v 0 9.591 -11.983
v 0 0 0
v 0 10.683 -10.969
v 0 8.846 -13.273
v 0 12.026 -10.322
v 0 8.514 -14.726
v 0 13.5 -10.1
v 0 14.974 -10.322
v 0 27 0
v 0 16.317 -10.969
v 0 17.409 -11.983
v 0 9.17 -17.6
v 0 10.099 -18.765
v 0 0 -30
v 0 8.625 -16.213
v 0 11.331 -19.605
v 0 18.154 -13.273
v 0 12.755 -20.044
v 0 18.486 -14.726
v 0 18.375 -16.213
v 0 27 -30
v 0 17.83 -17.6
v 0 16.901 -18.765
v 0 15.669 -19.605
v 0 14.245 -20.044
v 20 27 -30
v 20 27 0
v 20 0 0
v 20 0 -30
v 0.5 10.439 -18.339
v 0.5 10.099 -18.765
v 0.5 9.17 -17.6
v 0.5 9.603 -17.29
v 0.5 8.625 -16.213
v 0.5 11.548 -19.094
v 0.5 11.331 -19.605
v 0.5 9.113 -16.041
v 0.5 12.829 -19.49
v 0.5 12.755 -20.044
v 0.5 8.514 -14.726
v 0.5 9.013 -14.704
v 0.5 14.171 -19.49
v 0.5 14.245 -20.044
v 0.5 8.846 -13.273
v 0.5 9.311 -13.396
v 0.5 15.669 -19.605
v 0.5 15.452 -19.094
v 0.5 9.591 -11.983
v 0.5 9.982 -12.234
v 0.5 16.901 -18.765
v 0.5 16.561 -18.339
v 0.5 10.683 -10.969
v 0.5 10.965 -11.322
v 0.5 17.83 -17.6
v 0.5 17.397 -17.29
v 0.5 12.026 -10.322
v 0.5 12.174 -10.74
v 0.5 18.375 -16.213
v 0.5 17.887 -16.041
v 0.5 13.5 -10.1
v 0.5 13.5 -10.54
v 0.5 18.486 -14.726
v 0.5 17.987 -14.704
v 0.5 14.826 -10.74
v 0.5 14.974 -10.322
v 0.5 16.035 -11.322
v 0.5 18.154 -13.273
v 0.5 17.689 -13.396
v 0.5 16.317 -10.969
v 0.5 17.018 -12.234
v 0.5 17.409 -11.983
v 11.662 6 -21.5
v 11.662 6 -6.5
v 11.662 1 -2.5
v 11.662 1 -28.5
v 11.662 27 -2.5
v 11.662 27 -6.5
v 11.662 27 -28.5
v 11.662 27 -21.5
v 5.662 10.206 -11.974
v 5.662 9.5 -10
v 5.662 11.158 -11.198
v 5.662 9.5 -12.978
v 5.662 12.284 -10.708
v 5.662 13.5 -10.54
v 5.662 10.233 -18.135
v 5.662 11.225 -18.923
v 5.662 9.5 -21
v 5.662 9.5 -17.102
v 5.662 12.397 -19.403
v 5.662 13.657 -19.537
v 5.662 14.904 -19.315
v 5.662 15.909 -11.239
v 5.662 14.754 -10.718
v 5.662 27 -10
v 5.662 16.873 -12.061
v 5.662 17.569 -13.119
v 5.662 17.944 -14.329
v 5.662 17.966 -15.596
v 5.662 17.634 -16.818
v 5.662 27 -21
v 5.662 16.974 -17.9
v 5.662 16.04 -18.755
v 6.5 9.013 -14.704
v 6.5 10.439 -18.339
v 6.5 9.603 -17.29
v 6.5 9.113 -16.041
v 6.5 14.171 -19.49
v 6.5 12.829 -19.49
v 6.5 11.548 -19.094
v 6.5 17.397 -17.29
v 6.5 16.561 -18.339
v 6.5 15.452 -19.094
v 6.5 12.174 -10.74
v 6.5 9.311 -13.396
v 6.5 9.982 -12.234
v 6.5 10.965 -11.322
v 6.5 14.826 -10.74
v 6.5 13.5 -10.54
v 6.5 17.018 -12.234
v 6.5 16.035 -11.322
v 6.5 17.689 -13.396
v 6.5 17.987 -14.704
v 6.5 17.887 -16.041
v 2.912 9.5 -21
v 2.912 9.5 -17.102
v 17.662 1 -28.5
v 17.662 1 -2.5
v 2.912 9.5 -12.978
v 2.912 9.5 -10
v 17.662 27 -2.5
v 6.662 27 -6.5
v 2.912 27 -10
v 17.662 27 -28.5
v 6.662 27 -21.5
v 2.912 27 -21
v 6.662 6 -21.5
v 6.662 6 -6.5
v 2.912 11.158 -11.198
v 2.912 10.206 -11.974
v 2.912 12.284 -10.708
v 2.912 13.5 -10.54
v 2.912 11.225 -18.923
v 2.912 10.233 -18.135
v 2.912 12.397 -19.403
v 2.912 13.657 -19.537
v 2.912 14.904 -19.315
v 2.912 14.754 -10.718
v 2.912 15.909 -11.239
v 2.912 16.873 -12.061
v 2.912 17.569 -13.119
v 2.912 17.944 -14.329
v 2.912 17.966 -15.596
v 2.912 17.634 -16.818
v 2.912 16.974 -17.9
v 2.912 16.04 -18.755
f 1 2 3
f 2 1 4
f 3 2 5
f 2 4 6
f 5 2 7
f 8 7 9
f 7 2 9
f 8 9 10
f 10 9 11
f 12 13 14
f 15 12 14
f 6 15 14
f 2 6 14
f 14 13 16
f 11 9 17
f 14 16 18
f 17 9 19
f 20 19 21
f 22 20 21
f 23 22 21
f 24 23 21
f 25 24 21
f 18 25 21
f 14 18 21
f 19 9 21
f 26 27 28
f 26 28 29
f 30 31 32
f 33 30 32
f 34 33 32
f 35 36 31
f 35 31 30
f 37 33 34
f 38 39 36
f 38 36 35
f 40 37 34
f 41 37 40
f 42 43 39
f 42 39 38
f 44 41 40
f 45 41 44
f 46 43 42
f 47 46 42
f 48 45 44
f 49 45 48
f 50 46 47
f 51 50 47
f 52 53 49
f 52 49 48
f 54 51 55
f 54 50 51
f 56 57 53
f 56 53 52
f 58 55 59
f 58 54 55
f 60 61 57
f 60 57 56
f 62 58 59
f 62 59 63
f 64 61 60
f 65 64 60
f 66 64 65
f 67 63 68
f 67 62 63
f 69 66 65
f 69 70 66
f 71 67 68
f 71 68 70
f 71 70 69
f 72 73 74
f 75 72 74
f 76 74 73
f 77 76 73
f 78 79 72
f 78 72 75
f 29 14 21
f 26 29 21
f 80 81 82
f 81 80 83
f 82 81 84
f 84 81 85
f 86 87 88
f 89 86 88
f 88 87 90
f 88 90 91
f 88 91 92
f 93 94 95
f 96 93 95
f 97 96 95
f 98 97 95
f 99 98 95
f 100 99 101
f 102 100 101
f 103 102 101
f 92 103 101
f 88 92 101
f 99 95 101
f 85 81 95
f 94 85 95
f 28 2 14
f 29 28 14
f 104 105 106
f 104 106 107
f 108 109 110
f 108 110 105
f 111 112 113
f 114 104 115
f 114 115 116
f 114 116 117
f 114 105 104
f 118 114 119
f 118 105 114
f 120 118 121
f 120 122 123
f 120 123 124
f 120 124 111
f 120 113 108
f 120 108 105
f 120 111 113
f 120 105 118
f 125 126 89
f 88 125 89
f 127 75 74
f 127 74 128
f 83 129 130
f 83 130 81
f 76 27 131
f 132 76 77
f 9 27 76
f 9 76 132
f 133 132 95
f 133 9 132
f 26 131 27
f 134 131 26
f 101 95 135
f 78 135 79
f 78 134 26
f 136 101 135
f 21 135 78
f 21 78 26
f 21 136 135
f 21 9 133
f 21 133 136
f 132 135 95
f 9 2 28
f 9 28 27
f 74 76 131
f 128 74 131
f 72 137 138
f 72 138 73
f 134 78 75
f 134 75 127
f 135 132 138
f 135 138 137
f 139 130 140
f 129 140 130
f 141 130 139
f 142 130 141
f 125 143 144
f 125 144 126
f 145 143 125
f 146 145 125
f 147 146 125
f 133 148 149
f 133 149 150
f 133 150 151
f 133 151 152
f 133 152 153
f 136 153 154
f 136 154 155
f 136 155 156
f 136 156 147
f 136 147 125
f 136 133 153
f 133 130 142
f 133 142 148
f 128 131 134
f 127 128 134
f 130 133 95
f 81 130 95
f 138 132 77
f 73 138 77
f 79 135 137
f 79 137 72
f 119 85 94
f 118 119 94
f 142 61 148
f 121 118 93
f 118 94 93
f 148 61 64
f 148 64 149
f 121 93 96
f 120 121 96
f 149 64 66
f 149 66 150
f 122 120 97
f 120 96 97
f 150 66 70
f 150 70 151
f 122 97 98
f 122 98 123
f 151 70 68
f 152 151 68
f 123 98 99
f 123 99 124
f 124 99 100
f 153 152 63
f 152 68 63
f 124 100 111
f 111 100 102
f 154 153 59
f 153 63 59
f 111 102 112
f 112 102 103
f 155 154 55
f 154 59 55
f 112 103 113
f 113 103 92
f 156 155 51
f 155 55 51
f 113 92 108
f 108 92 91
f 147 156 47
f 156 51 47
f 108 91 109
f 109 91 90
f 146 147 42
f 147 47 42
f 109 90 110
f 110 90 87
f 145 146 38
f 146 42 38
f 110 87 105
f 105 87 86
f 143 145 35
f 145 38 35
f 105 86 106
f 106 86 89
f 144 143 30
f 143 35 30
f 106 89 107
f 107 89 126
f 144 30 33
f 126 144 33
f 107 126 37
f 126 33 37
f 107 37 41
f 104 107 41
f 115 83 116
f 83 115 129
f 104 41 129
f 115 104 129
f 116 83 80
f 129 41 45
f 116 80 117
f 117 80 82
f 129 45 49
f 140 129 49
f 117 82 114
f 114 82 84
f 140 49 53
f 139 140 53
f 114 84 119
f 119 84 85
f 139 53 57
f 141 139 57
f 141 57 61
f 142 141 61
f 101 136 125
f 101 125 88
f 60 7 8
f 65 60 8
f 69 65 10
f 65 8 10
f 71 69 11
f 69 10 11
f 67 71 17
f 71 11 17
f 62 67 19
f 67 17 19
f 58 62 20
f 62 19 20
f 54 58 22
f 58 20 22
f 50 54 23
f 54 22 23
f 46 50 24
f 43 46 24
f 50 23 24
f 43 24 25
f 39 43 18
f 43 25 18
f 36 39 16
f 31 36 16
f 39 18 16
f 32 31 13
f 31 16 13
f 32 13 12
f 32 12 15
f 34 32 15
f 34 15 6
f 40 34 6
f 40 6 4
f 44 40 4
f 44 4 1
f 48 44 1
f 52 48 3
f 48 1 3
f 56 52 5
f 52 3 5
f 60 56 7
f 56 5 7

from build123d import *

# Parameters (mm, degrees)
SKETCH2_W           = 30
SKETCH2_H           = 27
BOSS_EXTRUDE1_DEPTH = 20
SKETCH6_W           = 6
SKETCH6_H           = 26
CUT_EXTRUDE4_DEPTH  = 26
SKETCH9_W           = 5
SKETCH9_H           = 15
CUT_EXTRUDE5_DEPTH  = 21
SKETCH11_R          = 5
CUT_EXTRUDE8_DEPTH  = 0.5
SKETCH12_W          = 2.75
SKETCH12_H          = 11
CUT_EXTRUDE12_DEPTH = 17.5
SKETCH15_R          = 4.5
CUT_EXTRUDE13_DEPTH = 6


with BuildPart() as part:
    # Sketch2 → Boss-Extrude1 (new body)
    with BuildSketch(Plane(origin=(0, 0, 0), x_dir=(0, 0, -1), z_dir=(1, 0, 0))):
        with Locations((15, 13.5)):
            Rectangle(SKETCH2_W, SKETCH2_H)
    extrude(amount=BOSS_EXTRUDE1_DEPTH)

    # Sketch6 → Cut-Extrude4 (cut)
    with BuildSketch(Plane(origin=(2.296116437, 27, -0.293484995), x_dir=(1, 0, 0), z_dir=(0, 1, 0))):
        with Locations((12.365844825, 15.206515005)):
            Rectangle(SKETCH6_W, SKETCH6_H)
    extrude(amount=-CUT_EXTRUDE4_DEPTH, mode=Mode.SUBTRACT)

    # Sketch9 → Cut-Extrude5 (cut)
    with BuildSketch(Plane(origin=(0, 27, 0), x_dir=(1, 0, 0), z_dir=(0, 1, 0))):
        with Locations((9.161961261, 14)):
            Rectangle(SKETCH9_W, SKETCH9_H)
    extrude(amount=-CUT_EXTRUDE5_DEPTH, mode=Mode.SUBTRACT)

    # Sketch11 → Cut-Extrude8 (cut)
    with BuildSketch(Plane.ZY):
        with Locations((-15.1, 13.5)):
            Circle(SKETCH11_R)
    extrude(amount=-CUT_EXTRUDE8_DEPTH, mode=Mode.SUBTRACT)

    # Sketch12 → Cut-Extrude12 (cut)
    with BuildSketch(Plane(origin=(0, 27, 0), x_dir=(1, 0, 0), z_dir=(0, 1, 0))):
        with Locations((4.286961261, 15.5)):
            Rectangle(SKETCH12_W, SKETCH12_H)
    extrude(amount=-CUT_EXTRUDE12_DEPTH, mode=Mode.SUBTRACT)

    # Sketch15 → Cut-Extrude13 (cut)
    with BuildSketch(Plane.ZY.offset(-0.5)):
        with Locations((-15.04, 13.5)):
            Circle(SKETCH15_R)
    extrude(amount=-CUT_EXTRUDE13_DEPTH, mode=Mode.SUBTRACT)


solid = part.part
